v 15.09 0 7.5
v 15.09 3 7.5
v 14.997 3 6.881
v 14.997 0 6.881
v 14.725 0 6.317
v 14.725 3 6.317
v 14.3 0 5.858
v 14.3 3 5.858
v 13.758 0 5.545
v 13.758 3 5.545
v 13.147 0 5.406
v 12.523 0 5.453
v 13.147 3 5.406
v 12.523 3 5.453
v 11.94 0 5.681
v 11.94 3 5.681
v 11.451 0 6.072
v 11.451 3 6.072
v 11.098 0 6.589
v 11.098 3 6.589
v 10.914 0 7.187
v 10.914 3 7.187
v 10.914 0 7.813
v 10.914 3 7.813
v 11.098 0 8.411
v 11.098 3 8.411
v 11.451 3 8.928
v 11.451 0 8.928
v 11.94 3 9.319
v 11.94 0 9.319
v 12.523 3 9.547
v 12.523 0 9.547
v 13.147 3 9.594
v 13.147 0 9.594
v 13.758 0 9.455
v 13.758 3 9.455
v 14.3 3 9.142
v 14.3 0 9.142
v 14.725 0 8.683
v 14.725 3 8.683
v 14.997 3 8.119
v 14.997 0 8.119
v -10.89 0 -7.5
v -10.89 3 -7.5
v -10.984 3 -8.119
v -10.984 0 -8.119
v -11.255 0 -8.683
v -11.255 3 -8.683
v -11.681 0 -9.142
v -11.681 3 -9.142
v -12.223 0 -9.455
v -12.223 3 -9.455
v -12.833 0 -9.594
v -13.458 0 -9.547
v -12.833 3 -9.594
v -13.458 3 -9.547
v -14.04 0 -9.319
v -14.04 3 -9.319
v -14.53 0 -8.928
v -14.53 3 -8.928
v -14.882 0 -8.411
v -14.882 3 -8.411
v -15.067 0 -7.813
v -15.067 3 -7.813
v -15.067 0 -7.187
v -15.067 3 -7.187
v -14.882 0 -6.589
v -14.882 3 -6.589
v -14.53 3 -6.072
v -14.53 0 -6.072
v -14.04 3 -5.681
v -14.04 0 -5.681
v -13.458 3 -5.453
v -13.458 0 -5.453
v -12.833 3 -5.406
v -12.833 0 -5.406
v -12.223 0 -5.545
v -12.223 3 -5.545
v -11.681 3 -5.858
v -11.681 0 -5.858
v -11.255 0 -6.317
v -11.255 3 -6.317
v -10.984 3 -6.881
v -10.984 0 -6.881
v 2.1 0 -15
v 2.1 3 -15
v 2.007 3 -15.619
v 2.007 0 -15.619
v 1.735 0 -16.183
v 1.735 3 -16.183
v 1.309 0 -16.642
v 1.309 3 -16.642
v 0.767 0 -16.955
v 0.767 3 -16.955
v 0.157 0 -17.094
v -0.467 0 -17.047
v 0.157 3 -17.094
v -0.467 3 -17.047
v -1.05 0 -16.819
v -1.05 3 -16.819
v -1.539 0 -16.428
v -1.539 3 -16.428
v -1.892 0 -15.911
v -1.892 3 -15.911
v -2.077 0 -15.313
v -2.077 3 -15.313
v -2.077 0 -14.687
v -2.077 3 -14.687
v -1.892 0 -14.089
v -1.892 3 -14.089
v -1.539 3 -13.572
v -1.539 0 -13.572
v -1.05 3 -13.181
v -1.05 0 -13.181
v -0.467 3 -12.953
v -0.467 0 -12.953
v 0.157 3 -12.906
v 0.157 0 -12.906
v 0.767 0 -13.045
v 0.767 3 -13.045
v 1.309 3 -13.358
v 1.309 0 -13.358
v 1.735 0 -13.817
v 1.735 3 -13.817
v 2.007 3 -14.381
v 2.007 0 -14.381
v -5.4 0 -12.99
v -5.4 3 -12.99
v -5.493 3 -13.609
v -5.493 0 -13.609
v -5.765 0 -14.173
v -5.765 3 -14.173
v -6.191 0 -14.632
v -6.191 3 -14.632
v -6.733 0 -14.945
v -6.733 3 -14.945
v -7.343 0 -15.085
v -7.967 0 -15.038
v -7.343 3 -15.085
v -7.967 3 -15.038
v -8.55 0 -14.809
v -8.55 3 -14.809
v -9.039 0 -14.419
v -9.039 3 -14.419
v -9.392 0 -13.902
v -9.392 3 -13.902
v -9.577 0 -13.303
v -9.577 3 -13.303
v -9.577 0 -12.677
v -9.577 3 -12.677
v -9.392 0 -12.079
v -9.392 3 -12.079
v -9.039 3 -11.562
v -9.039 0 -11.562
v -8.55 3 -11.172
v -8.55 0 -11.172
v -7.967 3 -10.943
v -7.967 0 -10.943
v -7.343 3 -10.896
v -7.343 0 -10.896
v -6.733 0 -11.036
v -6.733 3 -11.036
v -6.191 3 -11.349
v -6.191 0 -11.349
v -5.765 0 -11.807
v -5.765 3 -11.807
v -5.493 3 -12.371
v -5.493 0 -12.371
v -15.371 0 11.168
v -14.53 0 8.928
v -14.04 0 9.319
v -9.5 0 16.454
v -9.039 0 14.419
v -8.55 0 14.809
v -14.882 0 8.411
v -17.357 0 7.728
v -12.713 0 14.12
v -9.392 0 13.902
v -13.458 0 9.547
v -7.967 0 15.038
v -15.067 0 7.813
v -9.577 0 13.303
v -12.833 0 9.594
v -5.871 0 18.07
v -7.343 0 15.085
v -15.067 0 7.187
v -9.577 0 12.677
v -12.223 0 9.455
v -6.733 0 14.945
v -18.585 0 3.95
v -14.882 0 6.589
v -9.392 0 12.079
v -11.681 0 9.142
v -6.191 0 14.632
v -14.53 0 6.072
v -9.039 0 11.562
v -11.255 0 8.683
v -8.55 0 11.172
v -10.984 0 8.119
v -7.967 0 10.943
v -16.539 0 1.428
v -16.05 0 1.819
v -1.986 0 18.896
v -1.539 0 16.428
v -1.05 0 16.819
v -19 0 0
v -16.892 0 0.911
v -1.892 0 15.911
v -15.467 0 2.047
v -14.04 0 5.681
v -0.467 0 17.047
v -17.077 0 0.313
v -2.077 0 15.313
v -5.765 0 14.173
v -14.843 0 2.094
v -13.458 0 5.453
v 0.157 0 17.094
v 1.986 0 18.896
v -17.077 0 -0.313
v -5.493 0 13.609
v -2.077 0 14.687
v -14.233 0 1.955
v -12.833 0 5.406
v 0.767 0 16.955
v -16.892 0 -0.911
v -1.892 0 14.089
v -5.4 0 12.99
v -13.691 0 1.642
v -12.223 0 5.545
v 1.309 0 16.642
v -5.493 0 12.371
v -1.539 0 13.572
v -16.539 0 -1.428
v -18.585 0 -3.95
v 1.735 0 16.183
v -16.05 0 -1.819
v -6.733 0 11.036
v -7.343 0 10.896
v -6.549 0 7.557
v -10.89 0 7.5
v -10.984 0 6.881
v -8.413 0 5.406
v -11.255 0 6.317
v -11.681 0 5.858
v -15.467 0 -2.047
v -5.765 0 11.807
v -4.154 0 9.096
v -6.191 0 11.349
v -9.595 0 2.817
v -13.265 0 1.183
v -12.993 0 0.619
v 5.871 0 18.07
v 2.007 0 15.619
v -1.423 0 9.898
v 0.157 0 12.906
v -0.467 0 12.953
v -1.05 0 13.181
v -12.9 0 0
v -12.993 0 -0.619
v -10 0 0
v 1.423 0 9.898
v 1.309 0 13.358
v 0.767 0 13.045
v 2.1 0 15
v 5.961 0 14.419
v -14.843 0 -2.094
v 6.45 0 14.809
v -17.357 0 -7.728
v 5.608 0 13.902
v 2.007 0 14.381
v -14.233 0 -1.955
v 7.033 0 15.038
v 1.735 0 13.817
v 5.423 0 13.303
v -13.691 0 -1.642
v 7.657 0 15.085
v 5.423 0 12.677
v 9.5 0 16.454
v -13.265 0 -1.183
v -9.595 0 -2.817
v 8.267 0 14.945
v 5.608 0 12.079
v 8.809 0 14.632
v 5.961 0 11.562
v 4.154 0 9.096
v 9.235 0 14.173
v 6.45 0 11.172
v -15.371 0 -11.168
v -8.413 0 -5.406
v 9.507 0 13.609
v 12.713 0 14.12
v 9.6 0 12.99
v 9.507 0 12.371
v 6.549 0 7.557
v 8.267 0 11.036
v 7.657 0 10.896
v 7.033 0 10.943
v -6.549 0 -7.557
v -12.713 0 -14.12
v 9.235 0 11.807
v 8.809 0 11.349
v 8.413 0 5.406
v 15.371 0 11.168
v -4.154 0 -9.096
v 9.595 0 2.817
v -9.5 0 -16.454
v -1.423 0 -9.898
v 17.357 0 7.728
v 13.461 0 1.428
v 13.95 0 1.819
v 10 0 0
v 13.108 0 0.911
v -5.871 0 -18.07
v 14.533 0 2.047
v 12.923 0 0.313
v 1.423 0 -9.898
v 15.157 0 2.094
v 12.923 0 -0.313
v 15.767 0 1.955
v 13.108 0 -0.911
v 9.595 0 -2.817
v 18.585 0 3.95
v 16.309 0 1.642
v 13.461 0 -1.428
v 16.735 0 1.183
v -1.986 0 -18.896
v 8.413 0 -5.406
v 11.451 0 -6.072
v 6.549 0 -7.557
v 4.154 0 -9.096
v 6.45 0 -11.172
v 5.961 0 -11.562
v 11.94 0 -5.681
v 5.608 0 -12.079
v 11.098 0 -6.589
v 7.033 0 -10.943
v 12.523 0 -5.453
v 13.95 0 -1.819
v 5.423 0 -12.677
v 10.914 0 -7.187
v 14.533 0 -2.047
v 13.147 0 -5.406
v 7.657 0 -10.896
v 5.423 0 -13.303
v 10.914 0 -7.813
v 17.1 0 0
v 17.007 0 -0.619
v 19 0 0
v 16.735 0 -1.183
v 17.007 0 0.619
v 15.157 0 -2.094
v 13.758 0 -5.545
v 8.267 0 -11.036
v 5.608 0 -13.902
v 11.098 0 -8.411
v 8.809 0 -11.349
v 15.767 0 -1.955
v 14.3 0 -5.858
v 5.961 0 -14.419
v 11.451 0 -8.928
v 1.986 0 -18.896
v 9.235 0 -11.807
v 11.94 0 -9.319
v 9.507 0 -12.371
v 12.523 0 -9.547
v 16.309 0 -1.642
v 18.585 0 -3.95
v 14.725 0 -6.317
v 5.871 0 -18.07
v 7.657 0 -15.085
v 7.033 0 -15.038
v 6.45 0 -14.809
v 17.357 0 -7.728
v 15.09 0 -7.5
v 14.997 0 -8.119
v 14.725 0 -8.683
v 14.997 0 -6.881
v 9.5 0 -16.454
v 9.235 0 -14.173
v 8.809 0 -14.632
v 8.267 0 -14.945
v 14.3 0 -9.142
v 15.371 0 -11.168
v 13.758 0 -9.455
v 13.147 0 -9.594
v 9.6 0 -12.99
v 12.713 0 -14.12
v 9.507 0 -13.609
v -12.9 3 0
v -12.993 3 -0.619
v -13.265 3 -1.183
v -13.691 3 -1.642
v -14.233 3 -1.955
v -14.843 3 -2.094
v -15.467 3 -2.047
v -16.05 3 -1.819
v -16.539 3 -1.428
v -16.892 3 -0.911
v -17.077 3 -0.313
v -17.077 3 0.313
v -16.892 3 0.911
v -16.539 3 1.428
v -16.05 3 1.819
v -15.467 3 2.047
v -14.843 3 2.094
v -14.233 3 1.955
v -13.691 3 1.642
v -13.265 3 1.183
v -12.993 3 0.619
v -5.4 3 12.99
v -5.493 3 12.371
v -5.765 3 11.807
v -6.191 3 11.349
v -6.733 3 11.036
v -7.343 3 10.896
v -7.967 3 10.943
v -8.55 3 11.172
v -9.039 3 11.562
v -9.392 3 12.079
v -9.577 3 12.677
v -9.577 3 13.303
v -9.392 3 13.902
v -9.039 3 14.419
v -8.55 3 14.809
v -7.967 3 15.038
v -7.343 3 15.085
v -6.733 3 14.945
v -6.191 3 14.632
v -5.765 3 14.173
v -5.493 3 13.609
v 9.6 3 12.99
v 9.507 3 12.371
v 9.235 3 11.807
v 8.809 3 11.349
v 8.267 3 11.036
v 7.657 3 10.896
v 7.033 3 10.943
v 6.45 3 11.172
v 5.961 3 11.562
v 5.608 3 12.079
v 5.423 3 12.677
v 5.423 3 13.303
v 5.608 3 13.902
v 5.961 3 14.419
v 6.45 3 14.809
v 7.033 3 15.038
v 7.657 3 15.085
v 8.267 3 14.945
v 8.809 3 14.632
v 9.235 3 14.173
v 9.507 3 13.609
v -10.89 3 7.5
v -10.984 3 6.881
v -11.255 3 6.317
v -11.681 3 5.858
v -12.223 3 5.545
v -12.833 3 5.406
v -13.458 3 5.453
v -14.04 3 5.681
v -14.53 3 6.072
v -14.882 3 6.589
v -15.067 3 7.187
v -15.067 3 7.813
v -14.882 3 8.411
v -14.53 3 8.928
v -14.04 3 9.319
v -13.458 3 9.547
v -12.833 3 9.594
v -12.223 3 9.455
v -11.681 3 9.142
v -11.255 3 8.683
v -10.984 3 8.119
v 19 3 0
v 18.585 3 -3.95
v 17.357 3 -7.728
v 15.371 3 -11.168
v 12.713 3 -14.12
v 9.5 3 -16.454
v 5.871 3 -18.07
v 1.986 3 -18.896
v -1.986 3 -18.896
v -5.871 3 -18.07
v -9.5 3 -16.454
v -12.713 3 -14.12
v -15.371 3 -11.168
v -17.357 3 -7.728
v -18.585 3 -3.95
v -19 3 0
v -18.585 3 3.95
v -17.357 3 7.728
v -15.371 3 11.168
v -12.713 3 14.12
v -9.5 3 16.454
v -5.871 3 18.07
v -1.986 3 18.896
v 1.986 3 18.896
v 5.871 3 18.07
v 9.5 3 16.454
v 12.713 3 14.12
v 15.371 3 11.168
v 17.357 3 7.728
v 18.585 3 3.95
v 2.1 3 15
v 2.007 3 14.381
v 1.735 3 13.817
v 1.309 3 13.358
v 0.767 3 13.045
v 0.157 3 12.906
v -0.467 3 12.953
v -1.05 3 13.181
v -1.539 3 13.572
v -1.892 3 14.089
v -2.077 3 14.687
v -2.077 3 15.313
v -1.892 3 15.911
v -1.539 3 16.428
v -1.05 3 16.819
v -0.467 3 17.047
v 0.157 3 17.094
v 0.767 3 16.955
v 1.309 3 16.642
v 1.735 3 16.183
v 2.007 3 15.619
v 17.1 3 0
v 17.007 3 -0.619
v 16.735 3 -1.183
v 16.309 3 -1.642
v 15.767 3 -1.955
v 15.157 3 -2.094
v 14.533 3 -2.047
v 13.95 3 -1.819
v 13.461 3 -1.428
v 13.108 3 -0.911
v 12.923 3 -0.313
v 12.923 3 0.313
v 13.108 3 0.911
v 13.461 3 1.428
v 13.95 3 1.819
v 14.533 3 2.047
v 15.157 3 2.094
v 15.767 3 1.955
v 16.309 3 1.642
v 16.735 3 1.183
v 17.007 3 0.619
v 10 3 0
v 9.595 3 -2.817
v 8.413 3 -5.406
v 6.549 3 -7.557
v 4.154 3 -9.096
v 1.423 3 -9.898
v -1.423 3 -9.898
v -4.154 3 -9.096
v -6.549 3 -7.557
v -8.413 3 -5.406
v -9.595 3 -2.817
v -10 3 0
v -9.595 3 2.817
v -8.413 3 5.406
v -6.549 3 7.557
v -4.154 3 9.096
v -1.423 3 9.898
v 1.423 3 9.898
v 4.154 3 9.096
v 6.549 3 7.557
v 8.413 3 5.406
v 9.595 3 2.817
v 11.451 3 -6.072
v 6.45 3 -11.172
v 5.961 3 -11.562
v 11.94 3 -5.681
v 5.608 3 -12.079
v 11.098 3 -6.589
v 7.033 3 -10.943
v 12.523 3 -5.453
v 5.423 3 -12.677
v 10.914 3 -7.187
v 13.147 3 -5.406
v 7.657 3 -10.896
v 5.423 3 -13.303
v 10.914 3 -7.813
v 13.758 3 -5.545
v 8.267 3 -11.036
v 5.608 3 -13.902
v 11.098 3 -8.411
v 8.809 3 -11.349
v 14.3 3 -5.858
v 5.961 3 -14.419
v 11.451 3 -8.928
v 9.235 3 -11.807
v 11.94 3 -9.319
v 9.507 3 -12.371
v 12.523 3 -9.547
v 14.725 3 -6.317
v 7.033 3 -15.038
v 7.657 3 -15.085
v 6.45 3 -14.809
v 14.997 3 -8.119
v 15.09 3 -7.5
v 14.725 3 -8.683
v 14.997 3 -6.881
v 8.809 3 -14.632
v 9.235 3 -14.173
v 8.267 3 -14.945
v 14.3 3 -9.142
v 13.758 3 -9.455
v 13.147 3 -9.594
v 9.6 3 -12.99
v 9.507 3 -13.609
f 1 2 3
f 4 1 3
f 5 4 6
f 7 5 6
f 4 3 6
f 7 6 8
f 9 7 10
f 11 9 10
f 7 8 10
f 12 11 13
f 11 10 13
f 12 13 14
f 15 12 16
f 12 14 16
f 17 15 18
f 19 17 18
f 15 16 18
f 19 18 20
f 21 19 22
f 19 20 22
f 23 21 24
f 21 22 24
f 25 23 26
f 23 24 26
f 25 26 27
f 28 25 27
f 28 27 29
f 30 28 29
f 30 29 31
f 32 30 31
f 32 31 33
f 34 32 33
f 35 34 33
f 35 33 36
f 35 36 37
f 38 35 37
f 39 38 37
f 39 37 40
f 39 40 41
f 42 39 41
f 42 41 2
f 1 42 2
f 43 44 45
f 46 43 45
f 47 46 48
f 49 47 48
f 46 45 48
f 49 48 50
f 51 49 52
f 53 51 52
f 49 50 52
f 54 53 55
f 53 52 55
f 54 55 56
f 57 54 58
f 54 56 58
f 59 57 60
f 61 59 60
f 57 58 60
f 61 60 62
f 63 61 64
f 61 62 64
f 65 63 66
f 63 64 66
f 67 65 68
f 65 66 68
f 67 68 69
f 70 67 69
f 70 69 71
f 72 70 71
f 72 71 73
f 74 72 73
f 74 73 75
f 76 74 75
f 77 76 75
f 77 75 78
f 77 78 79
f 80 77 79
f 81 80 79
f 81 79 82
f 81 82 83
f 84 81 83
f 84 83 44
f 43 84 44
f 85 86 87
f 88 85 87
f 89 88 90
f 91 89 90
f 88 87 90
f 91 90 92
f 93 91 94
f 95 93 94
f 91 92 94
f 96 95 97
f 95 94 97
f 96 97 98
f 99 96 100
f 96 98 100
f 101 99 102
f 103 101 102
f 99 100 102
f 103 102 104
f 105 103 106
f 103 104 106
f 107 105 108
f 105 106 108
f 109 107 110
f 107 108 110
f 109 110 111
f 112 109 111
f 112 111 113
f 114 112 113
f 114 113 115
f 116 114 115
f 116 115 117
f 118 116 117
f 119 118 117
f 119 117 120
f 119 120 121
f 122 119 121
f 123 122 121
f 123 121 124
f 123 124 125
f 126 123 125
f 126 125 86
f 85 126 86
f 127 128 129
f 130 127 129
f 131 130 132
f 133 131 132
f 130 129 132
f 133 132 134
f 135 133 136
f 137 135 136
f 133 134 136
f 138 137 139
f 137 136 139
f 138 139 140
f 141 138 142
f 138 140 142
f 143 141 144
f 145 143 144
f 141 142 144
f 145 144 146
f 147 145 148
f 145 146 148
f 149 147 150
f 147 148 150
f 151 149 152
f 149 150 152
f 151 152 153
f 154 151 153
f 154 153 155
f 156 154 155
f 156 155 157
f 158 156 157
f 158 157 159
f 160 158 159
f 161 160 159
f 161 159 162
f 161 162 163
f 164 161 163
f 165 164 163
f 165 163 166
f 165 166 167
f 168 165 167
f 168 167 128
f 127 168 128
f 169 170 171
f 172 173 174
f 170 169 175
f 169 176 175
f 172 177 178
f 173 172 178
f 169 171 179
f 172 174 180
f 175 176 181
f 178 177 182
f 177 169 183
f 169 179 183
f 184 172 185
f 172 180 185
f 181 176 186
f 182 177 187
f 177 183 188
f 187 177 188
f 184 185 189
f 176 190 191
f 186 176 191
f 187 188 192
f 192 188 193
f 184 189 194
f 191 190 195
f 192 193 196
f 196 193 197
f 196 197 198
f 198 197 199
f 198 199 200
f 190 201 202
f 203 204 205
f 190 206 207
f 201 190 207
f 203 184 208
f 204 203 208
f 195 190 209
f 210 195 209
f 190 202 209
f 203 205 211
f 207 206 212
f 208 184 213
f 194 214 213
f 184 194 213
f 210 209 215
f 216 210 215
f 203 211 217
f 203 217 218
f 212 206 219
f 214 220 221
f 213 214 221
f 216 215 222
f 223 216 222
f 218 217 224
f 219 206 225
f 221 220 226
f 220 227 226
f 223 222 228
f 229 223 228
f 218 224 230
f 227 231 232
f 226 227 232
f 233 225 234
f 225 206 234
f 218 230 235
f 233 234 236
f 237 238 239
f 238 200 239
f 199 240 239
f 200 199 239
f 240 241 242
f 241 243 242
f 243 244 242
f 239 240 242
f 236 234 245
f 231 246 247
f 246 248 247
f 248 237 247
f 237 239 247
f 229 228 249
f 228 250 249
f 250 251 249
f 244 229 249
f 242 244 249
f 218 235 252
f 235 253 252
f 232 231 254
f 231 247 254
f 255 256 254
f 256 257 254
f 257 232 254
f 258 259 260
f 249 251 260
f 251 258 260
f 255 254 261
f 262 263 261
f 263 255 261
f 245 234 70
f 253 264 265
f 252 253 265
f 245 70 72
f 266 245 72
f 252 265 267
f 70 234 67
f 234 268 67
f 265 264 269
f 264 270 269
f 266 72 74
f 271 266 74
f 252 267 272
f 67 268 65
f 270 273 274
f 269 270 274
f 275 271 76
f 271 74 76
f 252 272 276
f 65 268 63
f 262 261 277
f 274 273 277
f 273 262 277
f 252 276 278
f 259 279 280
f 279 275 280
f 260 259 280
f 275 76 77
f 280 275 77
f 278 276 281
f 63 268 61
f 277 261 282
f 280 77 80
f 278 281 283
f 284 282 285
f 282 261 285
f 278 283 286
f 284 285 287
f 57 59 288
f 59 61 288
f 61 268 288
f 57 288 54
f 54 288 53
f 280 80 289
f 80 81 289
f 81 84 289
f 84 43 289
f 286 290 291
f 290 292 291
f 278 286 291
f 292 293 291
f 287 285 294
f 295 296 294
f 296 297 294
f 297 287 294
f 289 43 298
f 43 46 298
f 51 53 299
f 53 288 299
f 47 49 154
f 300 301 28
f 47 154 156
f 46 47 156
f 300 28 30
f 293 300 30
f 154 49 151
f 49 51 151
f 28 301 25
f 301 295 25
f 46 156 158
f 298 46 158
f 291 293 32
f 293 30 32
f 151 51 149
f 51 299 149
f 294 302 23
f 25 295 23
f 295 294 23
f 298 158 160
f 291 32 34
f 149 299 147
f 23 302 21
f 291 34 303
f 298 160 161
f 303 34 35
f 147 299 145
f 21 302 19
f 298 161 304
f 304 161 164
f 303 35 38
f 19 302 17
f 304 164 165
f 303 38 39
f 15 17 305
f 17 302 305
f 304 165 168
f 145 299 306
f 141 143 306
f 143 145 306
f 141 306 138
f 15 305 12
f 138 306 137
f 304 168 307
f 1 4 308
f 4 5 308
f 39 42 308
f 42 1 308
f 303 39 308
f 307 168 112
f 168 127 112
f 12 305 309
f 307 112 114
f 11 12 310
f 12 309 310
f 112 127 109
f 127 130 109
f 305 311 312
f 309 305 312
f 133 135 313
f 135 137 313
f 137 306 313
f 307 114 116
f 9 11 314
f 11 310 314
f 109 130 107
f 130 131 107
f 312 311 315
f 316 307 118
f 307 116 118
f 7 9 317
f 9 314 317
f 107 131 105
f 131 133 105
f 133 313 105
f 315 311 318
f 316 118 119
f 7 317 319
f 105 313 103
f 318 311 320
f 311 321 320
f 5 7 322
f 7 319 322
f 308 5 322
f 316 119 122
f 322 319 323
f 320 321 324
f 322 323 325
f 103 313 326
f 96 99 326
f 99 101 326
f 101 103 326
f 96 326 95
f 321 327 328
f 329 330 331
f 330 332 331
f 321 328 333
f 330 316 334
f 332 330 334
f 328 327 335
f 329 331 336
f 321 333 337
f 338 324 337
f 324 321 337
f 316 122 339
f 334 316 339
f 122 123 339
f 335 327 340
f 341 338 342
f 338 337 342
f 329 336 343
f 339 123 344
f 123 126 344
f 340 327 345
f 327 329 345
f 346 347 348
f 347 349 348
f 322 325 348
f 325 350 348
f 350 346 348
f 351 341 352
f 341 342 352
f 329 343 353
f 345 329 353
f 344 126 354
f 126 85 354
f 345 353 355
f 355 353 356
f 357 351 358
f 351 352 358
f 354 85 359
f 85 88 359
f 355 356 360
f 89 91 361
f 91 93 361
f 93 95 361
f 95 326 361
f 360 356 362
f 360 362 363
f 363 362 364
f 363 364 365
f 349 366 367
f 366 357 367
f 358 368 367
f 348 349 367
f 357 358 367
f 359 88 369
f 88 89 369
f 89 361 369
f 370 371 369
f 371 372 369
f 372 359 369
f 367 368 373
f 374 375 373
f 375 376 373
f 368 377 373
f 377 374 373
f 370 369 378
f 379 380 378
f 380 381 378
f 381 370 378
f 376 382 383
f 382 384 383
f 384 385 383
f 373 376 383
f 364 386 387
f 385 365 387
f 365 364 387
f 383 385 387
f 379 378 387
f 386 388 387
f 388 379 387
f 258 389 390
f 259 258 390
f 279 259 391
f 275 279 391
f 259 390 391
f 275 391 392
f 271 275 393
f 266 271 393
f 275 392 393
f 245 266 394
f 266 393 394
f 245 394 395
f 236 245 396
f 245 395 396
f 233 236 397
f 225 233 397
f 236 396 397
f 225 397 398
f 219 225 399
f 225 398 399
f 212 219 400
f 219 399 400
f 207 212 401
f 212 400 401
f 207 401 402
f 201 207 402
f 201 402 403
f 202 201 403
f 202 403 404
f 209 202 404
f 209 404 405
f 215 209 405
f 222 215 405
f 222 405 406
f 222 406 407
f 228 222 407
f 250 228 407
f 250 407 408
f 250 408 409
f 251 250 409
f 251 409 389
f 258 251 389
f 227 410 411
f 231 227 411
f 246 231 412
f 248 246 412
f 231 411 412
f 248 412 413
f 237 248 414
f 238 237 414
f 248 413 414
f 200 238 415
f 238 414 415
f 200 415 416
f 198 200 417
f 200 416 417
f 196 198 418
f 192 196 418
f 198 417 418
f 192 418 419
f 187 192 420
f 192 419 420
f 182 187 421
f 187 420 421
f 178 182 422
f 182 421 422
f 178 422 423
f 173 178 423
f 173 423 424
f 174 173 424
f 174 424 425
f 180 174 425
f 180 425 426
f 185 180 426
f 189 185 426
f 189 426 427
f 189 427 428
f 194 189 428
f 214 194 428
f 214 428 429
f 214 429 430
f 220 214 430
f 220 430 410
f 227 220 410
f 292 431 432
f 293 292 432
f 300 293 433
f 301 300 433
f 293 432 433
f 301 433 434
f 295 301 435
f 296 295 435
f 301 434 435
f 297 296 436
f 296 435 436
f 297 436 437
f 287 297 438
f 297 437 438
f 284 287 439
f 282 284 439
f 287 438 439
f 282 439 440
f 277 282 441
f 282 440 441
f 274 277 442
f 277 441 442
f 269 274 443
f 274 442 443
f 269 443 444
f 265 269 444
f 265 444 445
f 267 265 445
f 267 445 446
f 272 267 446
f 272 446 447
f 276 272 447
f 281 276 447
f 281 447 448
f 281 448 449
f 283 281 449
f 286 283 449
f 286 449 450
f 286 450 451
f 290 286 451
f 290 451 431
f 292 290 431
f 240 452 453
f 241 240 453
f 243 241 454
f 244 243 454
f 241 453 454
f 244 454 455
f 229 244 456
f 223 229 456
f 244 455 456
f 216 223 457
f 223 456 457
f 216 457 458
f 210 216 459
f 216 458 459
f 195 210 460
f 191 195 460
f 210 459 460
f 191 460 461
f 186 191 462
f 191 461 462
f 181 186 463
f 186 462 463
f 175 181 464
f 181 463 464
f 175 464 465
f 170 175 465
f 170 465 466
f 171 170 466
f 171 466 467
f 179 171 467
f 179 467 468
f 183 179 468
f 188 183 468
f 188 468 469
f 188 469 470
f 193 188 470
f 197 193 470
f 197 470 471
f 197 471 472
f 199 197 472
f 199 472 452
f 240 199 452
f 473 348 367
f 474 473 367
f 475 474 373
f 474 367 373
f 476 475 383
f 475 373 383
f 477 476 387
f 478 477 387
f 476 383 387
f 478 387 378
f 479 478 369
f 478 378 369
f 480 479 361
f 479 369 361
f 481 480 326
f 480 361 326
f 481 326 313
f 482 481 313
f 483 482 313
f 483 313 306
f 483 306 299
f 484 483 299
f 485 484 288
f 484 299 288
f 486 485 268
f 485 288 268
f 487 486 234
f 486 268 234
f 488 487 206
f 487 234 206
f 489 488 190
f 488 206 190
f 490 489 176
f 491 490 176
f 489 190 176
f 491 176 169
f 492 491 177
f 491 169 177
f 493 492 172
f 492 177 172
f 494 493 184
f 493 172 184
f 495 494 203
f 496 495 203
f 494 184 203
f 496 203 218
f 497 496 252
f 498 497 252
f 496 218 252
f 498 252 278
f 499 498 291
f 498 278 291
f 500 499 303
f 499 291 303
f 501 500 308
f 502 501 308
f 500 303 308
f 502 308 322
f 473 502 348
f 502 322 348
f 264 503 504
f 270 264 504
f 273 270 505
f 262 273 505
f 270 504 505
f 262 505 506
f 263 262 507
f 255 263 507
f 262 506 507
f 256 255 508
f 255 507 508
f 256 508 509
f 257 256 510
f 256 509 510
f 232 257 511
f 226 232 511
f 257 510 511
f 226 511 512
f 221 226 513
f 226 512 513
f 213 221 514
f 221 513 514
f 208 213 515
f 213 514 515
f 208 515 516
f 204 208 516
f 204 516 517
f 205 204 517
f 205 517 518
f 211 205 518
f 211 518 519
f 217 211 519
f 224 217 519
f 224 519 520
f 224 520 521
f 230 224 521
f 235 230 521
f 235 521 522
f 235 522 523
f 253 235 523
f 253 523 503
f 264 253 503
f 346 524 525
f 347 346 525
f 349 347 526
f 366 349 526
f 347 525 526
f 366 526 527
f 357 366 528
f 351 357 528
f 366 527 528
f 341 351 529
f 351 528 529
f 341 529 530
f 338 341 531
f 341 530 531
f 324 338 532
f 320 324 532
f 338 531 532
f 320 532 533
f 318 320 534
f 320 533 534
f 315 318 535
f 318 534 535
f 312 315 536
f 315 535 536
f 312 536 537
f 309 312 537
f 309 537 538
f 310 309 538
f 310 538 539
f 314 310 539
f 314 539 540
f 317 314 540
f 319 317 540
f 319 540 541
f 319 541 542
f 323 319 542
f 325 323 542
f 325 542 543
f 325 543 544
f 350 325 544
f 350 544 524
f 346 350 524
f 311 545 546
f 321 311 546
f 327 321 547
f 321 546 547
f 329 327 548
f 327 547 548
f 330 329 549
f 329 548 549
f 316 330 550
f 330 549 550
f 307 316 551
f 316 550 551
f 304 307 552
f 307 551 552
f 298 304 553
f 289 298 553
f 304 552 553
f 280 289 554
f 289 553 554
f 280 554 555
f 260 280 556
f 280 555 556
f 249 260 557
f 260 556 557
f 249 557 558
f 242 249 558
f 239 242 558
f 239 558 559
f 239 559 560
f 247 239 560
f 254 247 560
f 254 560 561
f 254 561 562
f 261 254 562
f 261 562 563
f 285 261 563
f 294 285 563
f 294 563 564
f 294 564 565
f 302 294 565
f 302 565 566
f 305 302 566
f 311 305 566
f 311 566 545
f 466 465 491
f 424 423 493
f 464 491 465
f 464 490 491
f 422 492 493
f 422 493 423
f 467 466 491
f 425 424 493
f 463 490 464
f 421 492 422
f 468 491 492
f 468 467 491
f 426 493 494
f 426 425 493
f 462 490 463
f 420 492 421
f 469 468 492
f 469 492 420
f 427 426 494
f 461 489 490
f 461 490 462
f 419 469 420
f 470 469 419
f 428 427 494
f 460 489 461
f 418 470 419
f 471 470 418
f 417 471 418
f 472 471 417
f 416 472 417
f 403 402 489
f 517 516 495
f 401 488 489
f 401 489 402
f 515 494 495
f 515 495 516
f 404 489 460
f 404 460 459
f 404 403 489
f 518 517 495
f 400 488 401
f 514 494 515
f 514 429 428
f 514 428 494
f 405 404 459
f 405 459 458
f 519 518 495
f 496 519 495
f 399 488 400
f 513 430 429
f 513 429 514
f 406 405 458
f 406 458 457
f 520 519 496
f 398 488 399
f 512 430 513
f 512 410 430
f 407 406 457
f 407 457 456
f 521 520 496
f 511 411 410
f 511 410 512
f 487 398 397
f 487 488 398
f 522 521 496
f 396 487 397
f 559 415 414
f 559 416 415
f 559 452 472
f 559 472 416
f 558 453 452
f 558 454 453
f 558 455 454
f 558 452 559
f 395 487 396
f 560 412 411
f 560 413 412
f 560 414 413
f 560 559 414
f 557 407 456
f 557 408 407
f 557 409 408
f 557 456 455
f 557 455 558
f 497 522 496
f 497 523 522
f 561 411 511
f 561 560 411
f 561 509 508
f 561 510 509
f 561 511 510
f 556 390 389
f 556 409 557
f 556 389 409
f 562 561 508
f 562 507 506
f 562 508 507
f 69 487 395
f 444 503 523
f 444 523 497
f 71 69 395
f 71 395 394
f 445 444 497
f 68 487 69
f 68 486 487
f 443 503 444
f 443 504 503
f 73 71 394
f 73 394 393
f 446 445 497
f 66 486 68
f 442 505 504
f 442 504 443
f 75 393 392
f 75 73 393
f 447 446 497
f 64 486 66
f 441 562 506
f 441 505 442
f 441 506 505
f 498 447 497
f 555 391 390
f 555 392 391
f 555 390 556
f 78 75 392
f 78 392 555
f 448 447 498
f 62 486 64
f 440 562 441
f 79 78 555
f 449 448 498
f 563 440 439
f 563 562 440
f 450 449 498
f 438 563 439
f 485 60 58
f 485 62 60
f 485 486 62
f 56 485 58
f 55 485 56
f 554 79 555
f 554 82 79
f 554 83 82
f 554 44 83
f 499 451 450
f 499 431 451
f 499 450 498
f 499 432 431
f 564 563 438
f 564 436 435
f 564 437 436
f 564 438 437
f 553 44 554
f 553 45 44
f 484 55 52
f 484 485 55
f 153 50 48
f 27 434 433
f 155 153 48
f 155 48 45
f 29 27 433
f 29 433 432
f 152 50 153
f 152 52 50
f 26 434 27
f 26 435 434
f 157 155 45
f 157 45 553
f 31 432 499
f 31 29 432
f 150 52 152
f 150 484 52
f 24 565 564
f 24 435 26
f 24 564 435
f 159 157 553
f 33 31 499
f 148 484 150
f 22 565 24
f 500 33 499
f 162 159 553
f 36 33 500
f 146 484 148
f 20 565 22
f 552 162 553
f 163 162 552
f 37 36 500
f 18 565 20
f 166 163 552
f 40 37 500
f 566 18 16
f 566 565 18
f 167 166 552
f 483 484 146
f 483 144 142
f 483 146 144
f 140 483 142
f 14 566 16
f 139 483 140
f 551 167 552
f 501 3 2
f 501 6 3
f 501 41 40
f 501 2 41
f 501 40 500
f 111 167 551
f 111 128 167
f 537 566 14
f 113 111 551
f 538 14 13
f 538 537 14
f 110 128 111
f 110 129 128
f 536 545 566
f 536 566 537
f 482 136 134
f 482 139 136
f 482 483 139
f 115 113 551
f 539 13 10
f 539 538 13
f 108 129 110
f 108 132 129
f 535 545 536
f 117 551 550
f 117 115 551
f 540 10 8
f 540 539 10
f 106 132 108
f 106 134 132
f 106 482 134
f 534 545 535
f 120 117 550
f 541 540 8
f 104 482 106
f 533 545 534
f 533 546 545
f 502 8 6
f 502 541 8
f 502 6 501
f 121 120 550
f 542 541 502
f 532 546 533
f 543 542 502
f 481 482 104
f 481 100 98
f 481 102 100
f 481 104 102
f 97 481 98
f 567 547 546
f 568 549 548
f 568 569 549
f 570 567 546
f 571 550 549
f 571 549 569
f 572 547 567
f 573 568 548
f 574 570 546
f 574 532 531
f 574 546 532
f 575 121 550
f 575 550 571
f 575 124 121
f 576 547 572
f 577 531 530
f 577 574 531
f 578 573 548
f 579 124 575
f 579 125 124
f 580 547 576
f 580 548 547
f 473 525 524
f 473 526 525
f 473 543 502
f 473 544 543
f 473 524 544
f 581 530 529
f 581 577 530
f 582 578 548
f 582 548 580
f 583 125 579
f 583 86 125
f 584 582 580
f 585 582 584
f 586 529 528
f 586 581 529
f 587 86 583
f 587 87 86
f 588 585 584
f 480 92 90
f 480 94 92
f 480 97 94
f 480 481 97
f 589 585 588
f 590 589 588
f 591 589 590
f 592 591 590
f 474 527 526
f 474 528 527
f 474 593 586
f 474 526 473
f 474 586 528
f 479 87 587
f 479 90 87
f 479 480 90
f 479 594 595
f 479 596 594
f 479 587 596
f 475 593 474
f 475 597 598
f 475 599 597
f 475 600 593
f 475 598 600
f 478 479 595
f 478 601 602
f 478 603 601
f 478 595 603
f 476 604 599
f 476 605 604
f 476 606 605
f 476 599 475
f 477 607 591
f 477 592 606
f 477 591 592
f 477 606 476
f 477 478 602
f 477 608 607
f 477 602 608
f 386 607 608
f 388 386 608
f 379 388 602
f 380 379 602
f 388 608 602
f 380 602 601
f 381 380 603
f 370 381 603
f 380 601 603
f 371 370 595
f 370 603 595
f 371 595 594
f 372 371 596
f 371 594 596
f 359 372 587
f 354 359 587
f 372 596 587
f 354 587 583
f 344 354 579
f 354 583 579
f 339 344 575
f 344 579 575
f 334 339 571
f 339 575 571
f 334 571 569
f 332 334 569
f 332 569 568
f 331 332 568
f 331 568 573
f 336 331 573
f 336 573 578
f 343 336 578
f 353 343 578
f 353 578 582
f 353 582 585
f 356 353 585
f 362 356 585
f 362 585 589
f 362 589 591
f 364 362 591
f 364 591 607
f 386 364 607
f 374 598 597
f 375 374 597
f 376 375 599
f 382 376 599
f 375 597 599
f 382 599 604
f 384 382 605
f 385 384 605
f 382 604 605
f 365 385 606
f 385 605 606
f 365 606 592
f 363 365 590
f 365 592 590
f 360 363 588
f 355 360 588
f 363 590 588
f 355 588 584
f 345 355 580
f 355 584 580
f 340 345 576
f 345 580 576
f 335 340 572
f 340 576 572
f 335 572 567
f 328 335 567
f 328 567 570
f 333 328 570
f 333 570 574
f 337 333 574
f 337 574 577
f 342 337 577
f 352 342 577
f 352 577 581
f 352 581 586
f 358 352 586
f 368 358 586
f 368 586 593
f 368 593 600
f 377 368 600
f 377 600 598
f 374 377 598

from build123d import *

# Parameters (mm, degrees)
SKETCH_1_R          = 19
EXTRUDE_1_DEPTH     = 3
CUT_EXTRUDE_1_REACH = 5
SKETCH_2_R          = 2.1
CUT_EXTRUDE_2_REACH = 5
SKETCH_3_R          = 10


with BuildPart() as part:
    # ｽｹｯﾁ1 → ﾎﾞｽ - 押し出し1 (new body)
    with BuildSketch(Plane(origin=(0, 0, 0), x_dir=(1, 0, 0), z_dir=(0, 1, 0))):
        Circle(SKETCH_1_R)
    extrude(amount=EXTRUDE_1_DEPTH)

    # ｽｹｯﾁ2 → ｶｯﾄ - 押し出し1 (cut, up to next)
    with BuildSketch(Plane(origin=(0, 3, 0), x_dir=(1, 0, 0), z_dir=(0, 1, 0)), mode=Mode.PRIVATE) as cut_extrude_1_sk1:
        with Locations((0, 15)):
            Circle(SKETCH_2_R)
    cut_extrude_1_tool1 = extrude(cut_extrude_1_sk1.sketch, amount=-CUT_EXTRUDE_1_REACH, mode=Mode.PRIVATE) & part.part
    add(cut_extrude_1_tool1.solids().sort_by_distance((0, 3, -15))[0], mode=Mode.SUBTRACT)
    # ｽｹｯﾁ2 → ｶｯﾄ - 押し出し1 (cut, up to next)
    with BuildSketch(Plane(origin=(0, 3, 0), x_dir=(1, 0, 0), z_dir=(0, 1, 0)), mode=Mode.PRIVATE) as cut_extrude_1_sk2:
        with Locations((7.5, 12.990381057)):
            Circle(SKETCH_2_R)
    cut_extrude_1_tool2 = extrude(cut_extrude_1_sk2.sketch, amount=-CUT_EXTRUDE_1_REACH, mode=Mode.PRIVATE) & part.part
    add(cut_extrude_1_tool2.solids().sort_by_distance((7.5, 3, -12.990381))[0], mode=Mode.SUBTRACT)
    # ｽｹｯﾁ2 → ｶｯﾄ - 押し出し1 (cut, up to next)
    with BuildSketch(Plane(origin=(0, 3, 0), x_dir=(1, 0, 0), z_dir=(0, 1, 0)), mode=Mode.PRIVATE) as cut_extrude_1_sk3:
        with Locations((12.990381057, 7.5)):
            Circle(SKETCH_2_R)
    cut_extrude_1_tool3 = extrude(cut_extrude_1_sk3.sketch, amount=-CUT_EXTRUDE_1_REACH, mode=Mode.PRIVATE) & part.part
    add(cut_extrude_1_tool3.solids().sort_by_distance((12.990381, 3, -7.5))[0], mode=Mode.SUBTRACT)
    # ｽｹｯﾁ2 → ｶｯﾄ - 押し出し1 (cut, up to next)
    with BuildSketch(Plane(origin=(0, 3, 0), x_dir=(1, 0, 0), z_dir=(0, 1, 0)), mode=Mode.PRIVATE) as cut_extrude_1_sk4:
        with Locations((15, 0)):
            Circle(SKETCH_2_R)
    cut_extrude_1_tool4 = extrude(cut_extrude_1_sk4.sketch, amount=-CUT_EXTRUDE_1_REACH, mode=Mode.PRIVATE) & part.part
    add(cut_extrude_1_tool4.solids().sort_by_distance((15, 3, 0))[0], mode=Mode.SUBTRACT)
    # ｽｹｯﾁ2 → ｶｯﾄ - 押し出し1 (cut, up to next)
    with BuildSketch(Plane(origin=(0, 3, 0), x_dir=(1, 0, 0), z_dir=(0, 1, 0)), mode=Mode.PRIVATE) as cut_extrude_1_sk5:
        with Locations((12.990381057, -7.5)):
            Circle(SKETCH_2_R)
    cut_extrude_1_tool5 = extrude(cut_extrude_1_sk5.sketch, amount=-CUT_EXTRUDE_1_REACH, mode=Mode.PRIVATE) & part.part
    add(cut_extrude_1_tool5.solids().sort_by_distance((12.990381, 3, 7.5))[0], mode=Mode.SUBTRACT)
    # ｽｹｯﾁ2 → ｶｯﾄ - 押し出し1 (cut, up to next)
    with BuildSketch(Plane(origin=(0, 3, 0), x_dir=(1, 0, 0), z_dir=(0, 1, 0)), mode=Mode.PRIVATE) as cut_extrude_1_sk6:
        with Locations((7.5, -12.990381057)):
            Circle(SKETCH_2_R)
    cut_extrude_1_tool6 = extrude(cut_extrude_1_sk6.sketch, amount=-CUT_EXTRUDE_1_REACH, mode=Mode.PRIVATE) & part.part
    add(cut_extrude_1_tool6.solids().sort_by_distance((7.5, 3, 12.990381))[0], mode=Mode.SUBTRACT)
    # ｽｹｯﾁ2 → ｶｯﾄ - 押し出し1 (cut, up to next)
    with BuildSketch(Plane(origin=(0, 3, 0), x_dir=(1, 0, 0), z_dir=(0, 1, 0)), mode=Mode.PRIVATE) as cut_extrude_1_sk7:
        with Locations((0, -15)):
            Circle(SKETCH_2_R)
    cut_extrude_1_tool7 = extrude(cut_extrude_1_sk7.sketch, amount=-CUT_EXTRUDE_1_REACH, mode=Mode.PRIVATE) & part.part
    add(cut_extrude_1_tool7.solids().sort_by_distance((0, 3, 15))[0], mode=Mode.SUBTRACT)
    # ｽｹｯﾁ2 → ｶｯﾄ - 押し出し1 (cut, up to next)
    with BuildSketch(Plane(origin=(0, 3, 0), x_dir=(1, 0, 0), z_dir=(0, 1, 0)), mode=Mode.PRIVATE) as cut_extrude_1_sk8:
        with Locations((-7.5, -12.990381057)):
            Circle(SKETCH_2_R)
    cut_extrude_1_tool8 = extrude(cut_extrude_1_sk8.sketch, amount=-CUT_EXTRUDE_1_REACH, mode=Mode.PRIVATE) & part.part
    add(cut_extrude_1_tool8.solids().sort_by_distance((-7.5, 3, 12.990381))[0], mode=Mode.SUBTRACT)
    # ｽｹｯﾁ2 → ｶｯﾄ - 押し出し1 (cut, up to next)
    with BuildSketch(Plane(origin=(0, 3, 0), x_dir=(1, 0, 0), z_dir=(0, 1, 0)), mode=Mode.PRIVATE) as cut_extrude_1_sk9:
        with Locations((-12.990381057, -7.5)):
            Circle(SKETCH_2_R)
    cut_extrude_1_tool9 = extrude(cut_extrude_1_sk9.sketch, amount=-CUT_EXTRUDE_1_REACH, mode=Mode.PRIVATE) & part.part
    add(cut_extrude_1_tool9.solids().sort_by_distance((-12.990381, 3, 7.5))[0], mode=Mode.SUBTRACT)
    # ｽｹｯﾁ2 → ｶｯﾄ - 押し出し1 (cut, up to next)
    with BuildSketch(Plane(origin=(0, 3, 0), x_dir=(1, 0, 0), z_dir=(0, 1, 0)), mode=Mode.PRIVATE) as cut_extrude_1_sk10:
        with Locations((-15, 0)):
            Circle(SKETCH_2_R)
    cut_extrude_1_tool10 = extrude(cut_extrude_1_sk10.sketch, amount=-CUT_EXTRUDE_1_REACH, mode=Mode.PRIVATE) & part.part
    add(cut_extrude_1_tool10.solids().sort_by_distance((-15, 3, 0))[0], mode=Mode.SUBTRACT)
    # ｽｹｯﾁ2 → ｶｯﾄ - 押し出し1 (cut, up to next)
    with BuildSketch(Plane(origin=(0, 3, 0), x_dir=(1, 0, 0), z_dir=(0, 1, 0)), mode=Mode.PRIVATE) as cut_extrude_1_sk11:
        with Locations((-12.990381057, 7.5)):
            Circle(SKETCH_2_R)
    cut_extrude_1_tool11 = extrude(cut_extrude_1_sk11.sketch, amount=-CUT_EXTRUDE_1_REACH, mode=Mode.PRIVATE) & part.part
    add(cut_extrude_1_tool11.solids().sort_by_distance((-12.990381, 3, -7.5))[0], mode=Mode.SUBTRACT)
    # ｽｹｯﾁ2 → ｶｯﾄ - 押し出し1 (cut, up to next)
    with BuildSketch(Plane(origin=(0, 3, 0), x_dir=(1, 0, 0), z_dir=(0, 1, 0)), mode=Mode.PRIVATE) as cut_extrude_1_sk12:
        with Locations((-7.5, 12.990381057)):
            Circle(SKETCH_2_R)
    cut_extrude_1_tool12 = extrude(cut_extrude_1_sk12.sketch, amount=-CUT_EXTRUDE_1_REACH, mode=Mode.PRIVATE) & part.part
    add(cut_extrude_1_tool12.solids().sort_by_distance((-7.5, 3, -12.990381))[0], mode=Mode.SUBTRACT)

    # ｽｹｯﾁ3 → ｶｯﾄ - 押し出し2 (cut, up to next)
    with BuildSketch(Plane(origin=(0, 3, 0), x_dir=(1, 0, 0), z_dir=(0, 1, 0)), mode=Mode.PRIVATE) as cut_extrude_2_sk1:
        Circle(SKETCH_3_R)
    cut_extrude_2_tool1 = extrude(cut_extrude_2_sk1.sketch, amount=-CUT_EXTRUDE_2_REACH, mode=Mode.PRIVATE) & part.part
    add(cut_extrude_2_tool1.solids().sort_by_distance((0, 3, 0))[0], mode=Mode.SUBTRACT)


solid = part.part
